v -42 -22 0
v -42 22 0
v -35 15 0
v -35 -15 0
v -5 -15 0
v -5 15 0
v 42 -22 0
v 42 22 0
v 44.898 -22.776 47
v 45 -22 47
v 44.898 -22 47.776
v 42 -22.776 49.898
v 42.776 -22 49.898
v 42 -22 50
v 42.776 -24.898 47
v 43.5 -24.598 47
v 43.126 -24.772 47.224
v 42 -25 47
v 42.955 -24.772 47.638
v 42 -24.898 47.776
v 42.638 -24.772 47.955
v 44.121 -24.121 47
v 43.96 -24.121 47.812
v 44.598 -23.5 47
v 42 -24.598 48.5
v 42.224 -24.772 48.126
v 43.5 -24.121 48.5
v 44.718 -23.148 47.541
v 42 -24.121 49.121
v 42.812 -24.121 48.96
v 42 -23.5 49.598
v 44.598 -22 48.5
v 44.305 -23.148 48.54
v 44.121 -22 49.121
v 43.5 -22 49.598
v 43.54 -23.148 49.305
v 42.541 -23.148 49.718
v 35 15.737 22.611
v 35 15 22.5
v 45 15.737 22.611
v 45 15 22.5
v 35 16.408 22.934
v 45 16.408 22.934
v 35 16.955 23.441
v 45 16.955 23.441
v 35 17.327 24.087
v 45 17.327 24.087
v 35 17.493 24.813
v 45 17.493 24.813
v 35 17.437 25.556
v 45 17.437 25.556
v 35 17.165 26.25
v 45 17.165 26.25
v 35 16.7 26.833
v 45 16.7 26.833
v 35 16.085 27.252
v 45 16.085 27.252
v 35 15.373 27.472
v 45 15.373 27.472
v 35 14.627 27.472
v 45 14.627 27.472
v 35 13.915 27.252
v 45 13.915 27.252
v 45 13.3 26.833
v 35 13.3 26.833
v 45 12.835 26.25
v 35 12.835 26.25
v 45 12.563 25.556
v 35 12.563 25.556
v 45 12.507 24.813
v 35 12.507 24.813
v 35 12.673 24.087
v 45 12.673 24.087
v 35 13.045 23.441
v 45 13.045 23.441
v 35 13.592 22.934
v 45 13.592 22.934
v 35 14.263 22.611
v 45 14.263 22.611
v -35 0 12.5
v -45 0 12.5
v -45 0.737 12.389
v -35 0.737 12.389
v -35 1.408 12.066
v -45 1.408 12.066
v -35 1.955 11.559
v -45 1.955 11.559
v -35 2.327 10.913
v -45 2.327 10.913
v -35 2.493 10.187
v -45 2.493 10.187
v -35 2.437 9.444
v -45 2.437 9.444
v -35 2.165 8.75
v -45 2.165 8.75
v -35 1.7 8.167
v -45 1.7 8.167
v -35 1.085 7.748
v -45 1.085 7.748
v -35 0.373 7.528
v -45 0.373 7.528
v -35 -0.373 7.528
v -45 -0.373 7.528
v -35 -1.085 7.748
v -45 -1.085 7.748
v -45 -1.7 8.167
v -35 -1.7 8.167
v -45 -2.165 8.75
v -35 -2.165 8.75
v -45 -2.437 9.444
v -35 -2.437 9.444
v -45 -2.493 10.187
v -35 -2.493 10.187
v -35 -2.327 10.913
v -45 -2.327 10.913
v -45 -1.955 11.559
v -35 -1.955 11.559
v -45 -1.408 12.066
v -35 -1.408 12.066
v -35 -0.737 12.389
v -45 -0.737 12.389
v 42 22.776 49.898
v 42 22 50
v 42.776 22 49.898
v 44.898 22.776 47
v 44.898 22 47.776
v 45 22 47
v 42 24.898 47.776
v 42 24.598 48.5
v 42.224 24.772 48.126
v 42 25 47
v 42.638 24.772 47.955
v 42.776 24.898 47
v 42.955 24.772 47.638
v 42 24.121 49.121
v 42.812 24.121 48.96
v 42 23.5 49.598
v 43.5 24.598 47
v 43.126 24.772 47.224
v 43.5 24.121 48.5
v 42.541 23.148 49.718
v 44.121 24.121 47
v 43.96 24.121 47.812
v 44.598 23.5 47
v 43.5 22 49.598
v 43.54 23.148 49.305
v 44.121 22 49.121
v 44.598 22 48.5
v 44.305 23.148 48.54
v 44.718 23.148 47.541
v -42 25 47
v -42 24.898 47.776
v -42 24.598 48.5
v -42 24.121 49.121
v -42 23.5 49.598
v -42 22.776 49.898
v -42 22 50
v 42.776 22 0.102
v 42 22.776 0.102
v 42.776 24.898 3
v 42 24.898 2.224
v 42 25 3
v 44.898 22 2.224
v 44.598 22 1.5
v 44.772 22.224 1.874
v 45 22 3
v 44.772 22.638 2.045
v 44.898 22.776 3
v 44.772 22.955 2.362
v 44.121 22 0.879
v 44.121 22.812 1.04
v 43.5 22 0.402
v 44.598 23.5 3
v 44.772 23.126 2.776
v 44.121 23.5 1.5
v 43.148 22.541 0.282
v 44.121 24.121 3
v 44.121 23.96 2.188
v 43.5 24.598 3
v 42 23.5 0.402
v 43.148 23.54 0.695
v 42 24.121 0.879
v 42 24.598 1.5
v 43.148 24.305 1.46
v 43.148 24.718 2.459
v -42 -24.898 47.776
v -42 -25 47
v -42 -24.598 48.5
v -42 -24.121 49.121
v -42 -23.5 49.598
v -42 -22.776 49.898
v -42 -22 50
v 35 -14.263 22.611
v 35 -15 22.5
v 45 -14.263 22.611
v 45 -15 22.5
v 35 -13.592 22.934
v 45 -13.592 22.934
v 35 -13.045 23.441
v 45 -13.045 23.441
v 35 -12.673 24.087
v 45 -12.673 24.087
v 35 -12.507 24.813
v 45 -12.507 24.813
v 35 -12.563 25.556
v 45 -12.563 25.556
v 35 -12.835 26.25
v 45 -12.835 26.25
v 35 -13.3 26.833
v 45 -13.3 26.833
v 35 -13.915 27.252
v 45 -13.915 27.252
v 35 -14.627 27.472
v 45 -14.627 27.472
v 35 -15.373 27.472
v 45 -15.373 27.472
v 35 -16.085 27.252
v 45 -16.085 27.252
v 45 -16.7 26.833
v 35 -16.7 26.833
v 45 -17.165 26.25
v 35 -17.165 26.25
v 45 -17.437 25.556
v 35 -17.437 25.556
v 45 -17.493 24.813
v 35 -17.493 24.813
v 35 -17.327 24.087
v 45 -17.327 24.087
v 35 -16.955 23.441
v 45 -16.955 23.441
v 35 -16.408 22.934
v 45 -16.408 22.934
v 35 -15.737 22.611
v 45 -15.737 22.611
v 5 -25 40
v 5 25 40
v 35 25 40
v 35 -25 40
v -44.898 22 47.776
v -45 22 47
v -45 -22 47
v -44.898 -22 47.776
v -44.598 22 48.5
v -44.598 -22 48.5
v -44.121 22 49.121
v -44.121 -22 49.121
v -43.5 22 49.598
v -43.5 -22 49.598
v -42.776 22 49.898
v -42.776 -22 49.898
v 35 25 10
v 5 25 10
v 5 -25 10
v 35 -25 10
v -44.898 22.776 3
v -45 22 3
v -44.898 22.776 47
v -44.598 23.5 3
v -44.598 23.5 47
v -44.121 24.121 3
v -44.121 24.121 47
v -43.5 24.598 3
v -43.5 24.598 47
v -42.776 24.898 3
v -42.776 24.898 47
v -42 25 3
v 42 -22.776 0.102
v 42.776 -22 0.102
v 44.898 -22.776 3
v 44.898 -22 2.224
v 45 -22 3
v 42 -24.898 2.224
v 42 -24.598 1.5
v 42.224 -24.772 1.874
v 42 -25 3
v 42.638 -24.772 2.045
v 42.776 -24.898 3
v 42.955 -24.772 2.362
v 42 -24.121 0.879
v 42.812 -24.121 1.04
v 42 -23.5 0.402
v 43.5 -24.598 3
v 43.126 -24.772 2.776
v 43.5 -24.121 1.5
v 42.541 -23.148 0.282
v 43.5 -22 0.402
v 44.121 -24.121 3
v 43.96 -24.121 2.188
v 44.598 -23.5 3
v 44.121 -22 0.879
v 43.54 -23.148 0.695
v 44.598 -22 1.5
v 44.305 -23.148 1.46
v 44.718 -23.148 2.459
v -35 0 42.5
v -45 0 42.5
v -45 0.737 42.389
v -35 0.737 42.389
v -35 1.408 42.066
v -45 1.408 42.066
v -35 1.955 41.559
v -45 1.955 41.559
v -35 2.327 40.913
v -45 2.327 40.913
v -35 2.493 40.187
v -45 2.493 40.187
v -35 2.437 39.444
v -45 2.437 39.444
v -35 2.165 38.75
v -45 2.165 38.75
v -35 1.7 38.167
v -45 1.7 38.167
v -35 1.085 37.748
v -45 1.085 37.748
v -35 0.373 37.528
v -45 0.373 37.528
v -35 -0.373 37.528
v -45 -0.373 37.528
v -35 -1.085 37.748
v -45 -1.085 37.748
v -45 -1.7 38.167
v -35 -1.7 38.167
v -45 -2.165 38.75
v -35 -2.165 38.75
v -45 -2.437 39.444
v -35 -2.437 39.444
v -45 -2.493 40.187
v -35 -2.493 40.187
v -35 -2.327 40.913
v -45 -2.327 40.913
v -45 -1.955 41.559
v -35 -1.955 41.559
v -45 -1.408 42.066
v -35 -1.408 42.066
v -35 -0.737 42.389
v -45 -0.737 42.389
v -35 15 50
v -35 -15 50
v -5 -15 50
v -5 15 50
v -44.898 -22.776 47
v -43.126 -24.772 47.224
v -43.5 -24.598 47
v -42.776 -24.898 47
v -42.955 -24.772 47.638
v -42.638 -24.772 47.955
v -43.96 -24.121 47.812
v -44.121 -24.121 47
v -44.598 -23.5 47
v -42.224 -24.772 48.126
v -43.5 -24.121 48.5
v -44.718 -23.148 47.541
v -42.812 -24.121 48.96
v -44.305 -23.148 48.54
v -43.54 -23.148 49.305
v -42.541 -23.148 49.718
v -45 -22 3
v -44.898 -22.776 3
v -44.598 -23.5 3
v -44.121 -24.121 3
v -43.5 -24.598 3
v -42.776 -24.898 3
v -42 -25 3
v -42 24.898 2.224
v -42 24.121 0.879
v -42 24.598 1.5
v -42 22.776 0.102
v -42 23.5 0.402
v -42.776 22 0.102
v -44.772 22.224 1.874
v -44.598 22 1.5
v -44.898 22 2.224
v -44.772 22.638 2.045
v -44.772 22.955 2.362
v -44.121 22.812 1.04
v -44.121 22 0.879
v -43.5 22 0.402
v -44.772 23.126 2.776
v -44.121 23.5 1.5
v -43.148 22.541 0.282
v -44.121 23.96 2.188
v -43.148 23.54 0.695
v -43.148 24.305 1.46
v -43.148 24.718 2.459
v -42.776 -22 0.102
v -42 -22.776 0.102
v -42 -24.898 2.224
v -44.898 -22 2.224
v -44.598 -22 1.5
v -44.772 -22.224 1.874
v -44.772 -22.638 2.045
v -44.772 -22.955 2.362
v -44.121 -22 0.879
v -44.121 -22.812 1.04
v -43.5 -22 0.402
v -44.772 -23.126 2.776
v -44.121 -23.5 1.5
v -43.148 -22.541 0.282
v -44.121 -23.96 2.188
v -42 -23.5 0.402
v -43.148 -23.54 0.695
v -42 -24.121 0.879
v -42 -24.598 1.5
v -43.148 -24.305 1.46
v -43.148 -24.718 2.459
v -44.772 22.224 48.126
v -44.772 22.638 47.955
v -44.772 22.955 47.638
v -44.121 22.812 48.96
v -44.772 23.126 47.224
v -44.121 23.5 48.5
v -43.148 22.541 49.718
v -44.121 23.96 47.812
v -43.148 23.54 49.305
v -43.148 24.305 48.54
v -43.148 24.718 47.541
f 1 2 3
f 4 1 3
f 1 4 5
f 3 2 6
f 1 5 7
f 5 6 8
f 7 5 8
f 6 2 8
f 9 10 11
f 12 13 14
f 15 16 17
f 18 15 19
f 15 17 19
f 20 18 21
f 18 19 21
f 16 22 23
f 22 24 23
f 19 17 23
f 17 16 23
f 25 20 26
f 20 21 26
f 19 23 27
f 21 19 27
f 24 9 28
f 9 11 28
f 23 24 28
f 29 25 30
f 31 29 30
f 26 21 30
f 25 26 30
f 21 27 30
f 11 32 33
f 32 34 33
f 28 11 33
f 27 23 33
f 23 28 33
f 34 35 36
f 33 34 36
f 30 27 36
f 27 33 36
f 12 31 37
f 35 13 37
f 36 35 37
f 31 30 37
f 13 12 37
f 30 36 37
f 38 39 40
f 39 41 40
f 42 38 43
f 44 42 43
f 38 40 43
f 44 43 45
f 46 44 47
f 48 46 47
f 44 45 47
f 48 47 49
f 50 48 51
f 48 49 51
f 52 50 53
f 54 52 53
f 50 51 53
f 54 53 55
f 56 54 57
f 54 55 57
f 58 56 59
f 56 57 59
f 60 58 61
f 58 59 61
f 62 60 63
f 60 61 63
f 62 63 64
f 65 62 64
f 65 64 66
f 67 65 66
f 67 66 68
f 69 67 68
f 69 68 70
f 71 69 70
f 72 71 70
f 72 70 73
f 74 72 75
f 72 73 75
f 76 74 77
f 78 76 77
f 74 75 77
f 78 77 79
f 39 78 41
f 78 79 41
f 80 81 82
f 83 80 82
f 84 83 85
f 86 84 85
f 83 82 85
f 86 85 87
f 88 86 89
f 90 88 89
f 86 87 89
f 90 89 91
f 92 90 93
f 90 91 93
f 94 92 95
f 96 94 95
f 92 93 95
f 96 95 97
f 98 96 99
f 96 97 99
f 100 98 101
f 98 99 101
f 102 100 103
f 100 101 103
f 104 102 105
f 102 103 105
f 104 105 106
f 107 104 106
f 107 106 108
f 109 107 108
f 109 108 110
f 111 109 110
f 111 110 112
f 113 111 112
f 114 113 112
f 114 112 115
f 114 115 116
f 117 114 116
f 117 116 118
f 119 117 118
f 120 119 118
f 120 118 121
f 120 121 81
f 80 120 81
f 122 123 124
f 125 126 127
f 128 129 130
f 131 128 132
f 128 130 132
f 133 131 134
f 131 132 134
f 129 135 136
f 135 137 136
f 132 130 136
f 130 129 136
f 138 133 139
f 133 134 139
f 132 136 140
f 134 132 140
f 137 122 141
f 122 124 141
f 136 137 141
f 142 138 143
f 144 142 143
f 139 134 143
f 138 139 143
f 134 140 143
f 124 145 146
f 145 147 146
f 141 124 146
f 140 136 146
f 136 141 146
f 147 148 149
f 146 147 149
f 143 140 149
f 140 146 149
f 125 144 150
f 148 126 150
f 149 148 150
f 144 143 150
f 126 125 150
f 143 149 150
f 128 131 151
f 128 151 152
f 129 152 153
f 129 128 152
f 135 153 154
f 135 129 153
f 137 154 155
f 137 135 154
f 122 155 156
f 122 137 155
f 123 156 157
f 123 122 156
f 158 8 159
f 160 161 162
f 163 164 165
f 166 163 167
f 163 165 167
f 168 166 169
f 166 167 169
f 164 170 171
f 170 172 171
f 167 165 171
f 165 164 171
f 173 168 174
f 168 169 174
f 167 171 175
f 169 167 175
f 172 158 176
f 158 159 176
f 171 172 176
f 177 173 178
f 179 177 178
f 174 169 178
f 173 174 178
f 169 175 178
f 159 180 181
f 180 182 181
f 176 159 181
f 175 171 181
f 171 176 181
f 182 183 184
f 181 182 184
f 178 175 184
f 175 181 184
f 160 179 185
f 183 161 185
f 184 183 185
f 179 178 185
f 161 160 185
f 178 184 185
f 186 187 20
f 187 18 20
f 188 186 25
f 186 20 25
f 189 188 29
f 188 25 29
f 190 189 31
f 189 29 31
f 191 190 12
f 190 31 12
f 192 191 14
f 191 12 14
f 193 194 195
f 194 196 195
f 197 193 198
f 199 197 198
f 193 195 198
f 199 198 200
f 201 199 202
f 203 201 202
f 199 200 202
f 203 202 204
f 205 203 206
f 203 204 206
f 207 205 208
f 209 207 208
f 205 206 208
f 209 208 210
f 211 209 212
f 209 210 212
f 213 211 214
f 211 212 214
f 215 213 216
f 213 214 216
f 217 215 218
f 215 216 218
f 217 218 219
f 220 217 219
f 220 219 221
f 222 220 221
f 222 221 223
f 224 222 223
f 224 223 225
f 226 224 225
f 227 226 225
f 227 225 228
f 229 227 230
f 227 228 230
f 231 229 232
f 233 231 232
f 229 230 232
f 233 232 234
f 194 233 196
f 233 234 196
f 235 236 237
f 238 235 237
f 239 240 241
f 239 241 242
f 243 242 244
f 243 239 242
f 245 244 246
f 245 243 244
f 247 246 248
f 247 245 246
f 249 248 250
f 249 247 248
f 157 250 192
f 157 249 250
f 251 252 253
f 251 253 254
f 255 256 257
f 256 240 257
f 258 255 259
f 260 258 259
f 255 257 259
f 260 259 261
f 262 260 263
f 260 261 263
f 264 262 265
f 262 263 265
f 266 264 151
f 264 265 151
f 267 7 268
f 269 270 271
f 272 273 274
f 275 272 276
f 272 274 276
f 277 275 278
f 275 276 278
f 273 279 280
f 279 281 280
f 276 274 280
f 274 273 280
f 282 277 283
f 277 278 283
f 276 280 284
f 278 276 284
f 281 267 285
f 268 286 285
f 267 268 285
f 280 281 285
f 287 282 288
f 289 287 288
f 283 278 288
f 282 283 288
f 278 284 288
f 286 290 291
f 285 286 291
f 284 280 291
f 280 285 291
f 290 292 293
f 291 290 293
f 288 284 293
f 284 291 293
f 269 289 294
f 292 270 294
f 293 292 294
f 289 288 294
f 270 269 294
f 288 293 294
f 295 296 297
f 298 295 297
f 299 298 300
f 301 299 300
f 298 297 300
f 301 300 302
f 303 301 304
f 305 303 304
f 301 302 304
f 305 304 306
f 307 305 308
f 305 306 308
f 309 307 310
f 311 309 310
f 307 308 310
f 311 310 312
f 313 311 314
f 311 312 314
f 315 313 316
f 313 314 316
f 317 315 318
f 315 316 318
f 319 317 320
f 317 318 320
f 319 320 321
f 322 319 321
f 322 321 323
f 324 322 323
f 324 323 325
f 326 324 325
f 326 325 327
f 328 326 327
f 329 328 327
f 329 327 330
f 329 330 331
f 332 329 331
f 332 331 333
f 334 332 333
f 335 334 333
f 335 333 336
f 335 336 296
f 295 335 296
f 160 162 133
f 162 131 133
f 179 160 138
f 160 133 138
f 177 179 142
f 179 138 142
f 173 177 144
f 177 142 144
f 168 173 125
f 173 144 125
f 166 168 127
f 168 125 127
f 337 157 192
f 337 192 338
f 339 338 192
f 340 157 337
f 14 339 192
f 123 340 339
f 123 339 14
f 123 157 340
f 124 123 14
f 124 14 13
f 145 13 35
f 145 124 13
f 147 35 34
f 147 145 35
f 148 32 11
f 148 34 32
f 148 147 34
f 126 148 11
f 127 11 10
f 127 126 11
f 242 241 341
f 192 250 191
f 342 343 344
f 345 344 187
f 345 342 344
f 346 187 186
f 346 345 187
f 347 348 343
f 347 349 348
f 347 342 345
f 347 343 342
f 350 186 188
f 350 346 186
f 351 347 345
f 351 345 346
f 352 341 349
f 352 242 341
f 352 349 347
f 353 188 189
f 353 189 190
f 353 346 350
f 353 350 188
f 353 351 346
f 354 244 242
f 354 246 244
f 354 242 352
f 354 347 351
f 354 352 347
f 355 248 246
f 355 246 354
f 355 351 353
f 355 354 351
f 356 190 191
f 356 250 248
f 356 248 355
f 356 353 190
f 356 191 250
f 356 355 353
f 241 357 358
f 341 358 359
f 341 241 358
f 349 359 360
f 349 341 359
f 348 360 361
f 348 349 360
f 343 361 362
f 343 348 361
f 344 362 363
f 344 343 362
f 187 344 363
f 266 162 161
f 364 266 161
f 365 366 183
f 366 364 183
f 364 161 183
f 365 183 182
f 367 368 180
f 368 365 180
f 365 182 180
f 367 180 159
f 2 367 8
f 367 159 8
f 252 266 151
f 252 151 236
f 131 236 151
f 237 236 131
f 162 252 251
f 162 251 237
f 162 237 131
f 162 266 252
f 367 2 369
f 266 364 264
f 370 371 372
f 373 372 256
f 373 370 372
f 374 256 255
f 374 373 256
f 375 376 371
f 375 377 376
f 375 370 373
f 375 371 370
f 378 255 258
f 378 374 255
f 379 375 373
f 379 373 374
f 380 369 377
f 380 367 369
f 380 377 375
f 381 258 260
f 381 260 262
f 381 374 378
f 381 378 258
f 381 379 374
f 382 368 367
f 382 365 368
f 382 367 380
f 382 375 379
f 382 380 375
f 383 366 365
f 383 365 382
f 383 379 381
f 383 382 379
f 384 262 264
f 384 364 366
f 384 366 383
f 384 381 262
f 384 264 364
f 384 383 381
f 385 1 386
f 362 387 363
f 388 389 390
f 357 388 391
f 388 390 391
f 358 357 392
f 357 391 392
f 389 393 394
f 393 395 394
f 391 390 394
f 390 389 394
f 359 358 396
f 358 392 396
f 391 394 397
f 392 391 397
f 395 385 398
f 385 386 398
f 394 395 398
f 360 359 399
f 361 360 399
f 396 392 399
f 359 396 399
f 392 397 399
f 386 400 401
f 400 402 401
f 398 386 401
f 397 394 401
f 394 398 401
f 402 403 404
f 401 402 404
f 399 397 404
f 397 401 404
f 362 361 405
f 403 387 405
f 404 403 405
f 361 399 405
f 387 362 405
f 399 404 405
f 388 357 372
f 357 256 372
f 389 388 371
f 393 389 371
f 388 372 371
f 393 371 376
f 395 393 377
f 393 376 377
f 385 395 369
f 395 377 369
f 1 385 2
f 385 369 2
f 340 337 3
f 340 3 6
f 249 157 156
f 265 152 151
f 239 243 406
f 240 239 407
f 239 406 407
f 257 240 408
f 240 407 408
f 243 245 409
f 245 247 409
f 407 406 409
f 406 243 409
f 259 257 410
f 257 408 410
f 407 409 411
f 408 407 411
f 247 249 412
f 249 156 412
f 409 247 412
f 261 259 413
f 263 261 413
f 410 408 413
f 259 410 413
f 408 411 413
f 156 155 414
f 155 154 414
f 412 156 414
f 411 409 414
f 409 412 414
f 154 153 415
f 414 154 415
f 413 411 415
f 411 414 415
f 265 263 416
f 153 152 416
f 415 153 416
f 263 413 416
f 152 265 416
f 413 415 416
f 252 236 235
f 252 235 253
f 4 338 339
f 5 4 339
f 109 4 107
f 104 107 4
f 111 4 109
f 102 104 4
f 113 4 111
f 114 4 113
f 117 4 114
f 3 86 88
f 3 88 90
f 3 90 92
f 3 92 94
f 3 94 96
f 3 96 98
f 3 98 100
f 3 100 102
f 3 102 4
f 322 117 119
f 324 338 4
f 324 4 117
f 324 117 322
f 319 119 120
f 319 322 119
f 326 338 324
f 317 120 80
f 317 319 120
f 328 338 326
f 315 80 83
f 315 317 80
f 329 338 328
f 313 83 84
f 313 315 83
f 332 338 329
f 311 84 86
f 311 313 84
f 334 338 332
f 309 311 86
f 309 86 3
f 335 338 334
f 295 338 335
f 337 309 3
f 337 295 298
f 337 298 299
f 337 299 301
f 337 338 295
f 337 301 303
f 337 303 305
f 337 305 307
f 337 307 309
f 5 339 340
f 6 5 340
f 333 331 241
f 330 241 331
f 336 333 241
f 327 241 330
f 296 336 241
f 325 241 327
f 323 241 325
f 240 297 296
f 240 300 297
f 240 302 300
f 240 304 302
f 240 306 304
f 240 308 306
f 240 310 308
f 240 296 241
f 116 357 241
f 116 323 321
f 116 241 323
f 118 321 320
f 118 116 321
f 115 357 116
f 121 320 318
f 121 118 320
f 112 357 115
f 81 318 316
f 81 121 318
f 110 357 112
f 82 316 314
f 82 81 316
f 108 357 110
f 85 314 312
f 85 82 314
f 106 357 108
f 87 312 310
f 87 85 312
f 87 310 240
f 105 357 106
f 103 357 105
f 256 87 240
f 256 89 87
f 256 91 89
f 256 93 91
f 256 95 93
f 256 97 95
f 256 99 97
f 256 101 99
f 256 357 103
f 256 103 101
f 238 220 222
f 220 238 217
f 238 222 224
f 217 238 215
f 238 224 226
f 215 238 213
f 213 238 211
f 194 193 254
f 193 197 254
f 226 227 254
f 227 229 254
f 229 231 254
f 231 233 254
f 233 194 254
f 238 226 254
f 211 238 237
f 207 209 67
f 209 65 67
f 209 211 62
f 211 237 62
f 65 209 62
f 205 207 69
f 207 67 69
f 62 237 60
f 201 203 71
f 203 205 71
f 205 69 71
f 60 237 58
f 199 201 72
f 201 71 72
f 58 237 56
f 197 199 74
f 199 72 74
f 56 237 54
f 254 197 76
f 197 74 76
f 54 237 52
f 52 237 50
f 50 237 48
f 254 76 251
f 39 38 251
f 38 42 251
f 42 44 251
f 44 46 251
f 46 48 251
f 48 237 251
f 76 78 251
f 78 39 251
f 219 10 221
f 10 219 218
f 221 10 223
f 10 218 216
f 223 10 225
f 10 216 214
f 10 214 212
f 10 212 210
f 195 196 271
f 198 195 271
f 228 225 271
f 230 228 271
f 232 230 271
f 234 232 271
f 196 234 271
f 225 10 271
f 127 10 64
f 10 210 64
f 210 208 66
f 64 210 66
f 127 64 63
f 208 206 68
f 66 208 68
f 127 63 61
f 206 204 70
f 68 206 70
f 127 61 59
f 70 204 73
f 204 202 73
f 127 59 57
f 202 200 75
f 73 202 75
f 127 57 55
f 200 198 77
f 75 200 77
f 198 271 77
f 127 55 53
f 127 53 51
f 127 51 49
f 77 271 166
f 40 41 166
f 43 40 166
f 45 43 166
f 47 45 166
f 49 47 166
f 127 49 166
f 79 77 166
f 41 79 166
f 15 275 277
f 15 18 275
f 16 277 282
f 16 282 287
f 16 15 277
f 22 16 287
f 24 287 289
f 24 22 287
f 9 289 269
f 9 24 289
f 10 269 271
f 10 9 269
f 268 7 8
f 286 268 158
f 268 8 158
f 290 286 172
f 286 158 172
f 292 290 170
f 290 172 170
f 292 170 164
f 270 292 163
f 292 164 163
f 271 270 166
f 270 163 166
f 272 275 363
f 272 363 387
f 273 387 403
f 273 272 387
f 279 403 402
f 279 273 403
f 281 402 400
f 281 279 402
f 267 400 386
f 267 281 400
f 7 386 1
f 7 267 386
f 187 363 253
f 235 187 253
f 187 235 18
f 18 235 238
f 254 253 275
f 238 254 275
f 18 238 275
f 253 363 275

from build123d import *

# Parameters (mm, degrees)
SKETCH1_W           = 90
SKETCH1_H           = 50
BOSS_EXTRUDE1_DEPTH = 50
CUT_EXTRUDE1_REACH  = 52
SKETCH2_W           = 30
SKETCH2_H           = 30
CUT_EXTRUDE2_REACH  = 52
SKETCH3_W           = 30
SKETCH3_H           = 30
FILLET1_R           = 3
CUT_EXTRUDE3_REACH  = 92
SKETCH4_R           = 2.5
CUT_EXTRUDE4_REACH  = 92
SKETCH5_R           = 2.5


with BuildPart() as part:
    # Sketch1 → Boss-Extrude1 (new body)
    with BuildSketch(Plane.XY):
        Rectangle(SKETCH1_W, SKETCH1_H)
    extrude(amount=BOSS_EXTRUDE1_DEPTH)

    # Sketch2 → Cut-Extrude1 (cut, up to next)
    with BuildSketch(Plane.XY.offset(50), mode=Mode.PRIVATE) as cut_extrude1_sk1:
        with Locations((-20, 0)):
            Rectangle(SKETCH2_W, SKETCH2_H)
    cut_extrude1_tool1 = extrude(cut_extrude1_sk1.sketch, amount=-CUT_EXTRUDE1_REACH, mode=Mode.PRIVATE) & part.part
    add(cut_extrude1_tool1.solids().sort_by_distance((-20, 0, 50))[0], mode=Mode.SUBTRACT)

    # Sketch3 → Cut-Extrude2 (cut, up to next)
    with BuildSketch(Plane(origin=(0, 25, 0), x_dir=(1, 0, 0), z_dir=(0, 1, 0)), mode=Mode.PRIVATE) as cut_extrude2_sk1:
        with Locations((20, -25)):
            Rectangle(SKETCH3_W, SKETCH3_H)
    cut_extrude2_tool1 = extrude(cut_extrude2_sk1.sketch, amount=-CUT_EXTRUDE2_REACH, mode=Mode.PRIVATE) & part.part
    add(cut_extrude2_tool1.solids().sort_by_distance((20, 25, 25))[0], mode=Mode.SUBTRACT)

    # Fillet1
    fillet1_edges = [part.edges().sort_by_distance(p)[0] for p in [
        (45, 0, 50),
        (0, 25, 50),
        (-45, 0, 50),
        (0, 25, 0),
        (45, 0, 0),
        (0, -25, 0),
        (-45, 0, 0),
        (-45, 25, 25),
        (45, 25, 25),
        (45, -25, 25),
        (-45, -25, 25),
        (0, -25, 50),
    ]]
    fillet(fillet1_edges, radius=FILLET1_R)

    # Sketch4 → Cut-Extrude3 (cut, up to next)
    with BuildSketch(Plane.ZY.offset(45), mode=Mode.PRIVATE) as cut_extrude3_sk1:
        with Locations((10, 0)):
            Circle(SKETCH4_R)
    cut_extrude3_tool1 = extrude(cut_extrude3_sk1.sketch, amount=-CUT_EXTRUDE3_REACH, mode=Mode.PRIVATE) & part.part
    add(cut_extrude3_tool1.solids().sort_by_distance((-45, 0, 10))[0], mode=Mode.SUBTRACT)
    # Sketch4 → Cut-Extrude3 (cut, up to next)
    with BuildSketch(Plane.ZY.offset(45), mode=Mode.PRIVATE) as cut_extrude3_sk2:
        with Locations((40, 0)):
            Circle(SKETCH4_R)
    cut_extrude3_tool2 = extrude(cut_extrude3_sk2.sketch, amount=-CUT_EXTRUDE3_REACH, mode=Mode.PRIVATE) & part.part
    add(cut_extrude3_tool2.solids().sort_by_distance((-45, 0, 40))[0], mode=Mode.SUBTRACT)

    # Sketch5 → Cut-Extrude4 (cut, up to next)
    with BuildSketch(Plane(origin=(45, 0, 0), x_dir=(0, 0, -1), z_dir=(1, 0, 0)), mode=Mode.PRIVATE) as cut_extrude4_sk1:
        with Locations((-25, 15)):
            Circle(SKETCH5_R)
    cut_extrude4_tool1 = extrude(cut_extrude4_sk1.sketch, amount=-CUT_EXTRUDE4_REACH, mode=Mode.PRIVATE) & part.part
    add(cut_extrude4_tool1.solids().sort_by_distance((45, 15, 25))[0], mode=Mode.SUBTRACT)
    # Sketch5 → Cut-Extrude4 (cut, up to next)
    with BuildSketch(Plane(origin=(45, 0, 0), x_dir=(0, 0, -1), z_dir=(1, 0, 0)), mode=Mode.PRIVATE) as cut_extrude4_sk2:
        with Locations((-25, -15)):
            Circle(SKETCH5_R)
    cut_extrude4_tool2 = extrude(cut_extrude4_sk2.sketch, amount=-CUT_EXTRUDE4_REACH, mode=Mode.PRIVATE) & part.part
    add(cut_extrude4_tool2.solids().sort_by_distance((45, -15, 25))[0], mode=Mode.SUBTRACT)


solid = part.part
